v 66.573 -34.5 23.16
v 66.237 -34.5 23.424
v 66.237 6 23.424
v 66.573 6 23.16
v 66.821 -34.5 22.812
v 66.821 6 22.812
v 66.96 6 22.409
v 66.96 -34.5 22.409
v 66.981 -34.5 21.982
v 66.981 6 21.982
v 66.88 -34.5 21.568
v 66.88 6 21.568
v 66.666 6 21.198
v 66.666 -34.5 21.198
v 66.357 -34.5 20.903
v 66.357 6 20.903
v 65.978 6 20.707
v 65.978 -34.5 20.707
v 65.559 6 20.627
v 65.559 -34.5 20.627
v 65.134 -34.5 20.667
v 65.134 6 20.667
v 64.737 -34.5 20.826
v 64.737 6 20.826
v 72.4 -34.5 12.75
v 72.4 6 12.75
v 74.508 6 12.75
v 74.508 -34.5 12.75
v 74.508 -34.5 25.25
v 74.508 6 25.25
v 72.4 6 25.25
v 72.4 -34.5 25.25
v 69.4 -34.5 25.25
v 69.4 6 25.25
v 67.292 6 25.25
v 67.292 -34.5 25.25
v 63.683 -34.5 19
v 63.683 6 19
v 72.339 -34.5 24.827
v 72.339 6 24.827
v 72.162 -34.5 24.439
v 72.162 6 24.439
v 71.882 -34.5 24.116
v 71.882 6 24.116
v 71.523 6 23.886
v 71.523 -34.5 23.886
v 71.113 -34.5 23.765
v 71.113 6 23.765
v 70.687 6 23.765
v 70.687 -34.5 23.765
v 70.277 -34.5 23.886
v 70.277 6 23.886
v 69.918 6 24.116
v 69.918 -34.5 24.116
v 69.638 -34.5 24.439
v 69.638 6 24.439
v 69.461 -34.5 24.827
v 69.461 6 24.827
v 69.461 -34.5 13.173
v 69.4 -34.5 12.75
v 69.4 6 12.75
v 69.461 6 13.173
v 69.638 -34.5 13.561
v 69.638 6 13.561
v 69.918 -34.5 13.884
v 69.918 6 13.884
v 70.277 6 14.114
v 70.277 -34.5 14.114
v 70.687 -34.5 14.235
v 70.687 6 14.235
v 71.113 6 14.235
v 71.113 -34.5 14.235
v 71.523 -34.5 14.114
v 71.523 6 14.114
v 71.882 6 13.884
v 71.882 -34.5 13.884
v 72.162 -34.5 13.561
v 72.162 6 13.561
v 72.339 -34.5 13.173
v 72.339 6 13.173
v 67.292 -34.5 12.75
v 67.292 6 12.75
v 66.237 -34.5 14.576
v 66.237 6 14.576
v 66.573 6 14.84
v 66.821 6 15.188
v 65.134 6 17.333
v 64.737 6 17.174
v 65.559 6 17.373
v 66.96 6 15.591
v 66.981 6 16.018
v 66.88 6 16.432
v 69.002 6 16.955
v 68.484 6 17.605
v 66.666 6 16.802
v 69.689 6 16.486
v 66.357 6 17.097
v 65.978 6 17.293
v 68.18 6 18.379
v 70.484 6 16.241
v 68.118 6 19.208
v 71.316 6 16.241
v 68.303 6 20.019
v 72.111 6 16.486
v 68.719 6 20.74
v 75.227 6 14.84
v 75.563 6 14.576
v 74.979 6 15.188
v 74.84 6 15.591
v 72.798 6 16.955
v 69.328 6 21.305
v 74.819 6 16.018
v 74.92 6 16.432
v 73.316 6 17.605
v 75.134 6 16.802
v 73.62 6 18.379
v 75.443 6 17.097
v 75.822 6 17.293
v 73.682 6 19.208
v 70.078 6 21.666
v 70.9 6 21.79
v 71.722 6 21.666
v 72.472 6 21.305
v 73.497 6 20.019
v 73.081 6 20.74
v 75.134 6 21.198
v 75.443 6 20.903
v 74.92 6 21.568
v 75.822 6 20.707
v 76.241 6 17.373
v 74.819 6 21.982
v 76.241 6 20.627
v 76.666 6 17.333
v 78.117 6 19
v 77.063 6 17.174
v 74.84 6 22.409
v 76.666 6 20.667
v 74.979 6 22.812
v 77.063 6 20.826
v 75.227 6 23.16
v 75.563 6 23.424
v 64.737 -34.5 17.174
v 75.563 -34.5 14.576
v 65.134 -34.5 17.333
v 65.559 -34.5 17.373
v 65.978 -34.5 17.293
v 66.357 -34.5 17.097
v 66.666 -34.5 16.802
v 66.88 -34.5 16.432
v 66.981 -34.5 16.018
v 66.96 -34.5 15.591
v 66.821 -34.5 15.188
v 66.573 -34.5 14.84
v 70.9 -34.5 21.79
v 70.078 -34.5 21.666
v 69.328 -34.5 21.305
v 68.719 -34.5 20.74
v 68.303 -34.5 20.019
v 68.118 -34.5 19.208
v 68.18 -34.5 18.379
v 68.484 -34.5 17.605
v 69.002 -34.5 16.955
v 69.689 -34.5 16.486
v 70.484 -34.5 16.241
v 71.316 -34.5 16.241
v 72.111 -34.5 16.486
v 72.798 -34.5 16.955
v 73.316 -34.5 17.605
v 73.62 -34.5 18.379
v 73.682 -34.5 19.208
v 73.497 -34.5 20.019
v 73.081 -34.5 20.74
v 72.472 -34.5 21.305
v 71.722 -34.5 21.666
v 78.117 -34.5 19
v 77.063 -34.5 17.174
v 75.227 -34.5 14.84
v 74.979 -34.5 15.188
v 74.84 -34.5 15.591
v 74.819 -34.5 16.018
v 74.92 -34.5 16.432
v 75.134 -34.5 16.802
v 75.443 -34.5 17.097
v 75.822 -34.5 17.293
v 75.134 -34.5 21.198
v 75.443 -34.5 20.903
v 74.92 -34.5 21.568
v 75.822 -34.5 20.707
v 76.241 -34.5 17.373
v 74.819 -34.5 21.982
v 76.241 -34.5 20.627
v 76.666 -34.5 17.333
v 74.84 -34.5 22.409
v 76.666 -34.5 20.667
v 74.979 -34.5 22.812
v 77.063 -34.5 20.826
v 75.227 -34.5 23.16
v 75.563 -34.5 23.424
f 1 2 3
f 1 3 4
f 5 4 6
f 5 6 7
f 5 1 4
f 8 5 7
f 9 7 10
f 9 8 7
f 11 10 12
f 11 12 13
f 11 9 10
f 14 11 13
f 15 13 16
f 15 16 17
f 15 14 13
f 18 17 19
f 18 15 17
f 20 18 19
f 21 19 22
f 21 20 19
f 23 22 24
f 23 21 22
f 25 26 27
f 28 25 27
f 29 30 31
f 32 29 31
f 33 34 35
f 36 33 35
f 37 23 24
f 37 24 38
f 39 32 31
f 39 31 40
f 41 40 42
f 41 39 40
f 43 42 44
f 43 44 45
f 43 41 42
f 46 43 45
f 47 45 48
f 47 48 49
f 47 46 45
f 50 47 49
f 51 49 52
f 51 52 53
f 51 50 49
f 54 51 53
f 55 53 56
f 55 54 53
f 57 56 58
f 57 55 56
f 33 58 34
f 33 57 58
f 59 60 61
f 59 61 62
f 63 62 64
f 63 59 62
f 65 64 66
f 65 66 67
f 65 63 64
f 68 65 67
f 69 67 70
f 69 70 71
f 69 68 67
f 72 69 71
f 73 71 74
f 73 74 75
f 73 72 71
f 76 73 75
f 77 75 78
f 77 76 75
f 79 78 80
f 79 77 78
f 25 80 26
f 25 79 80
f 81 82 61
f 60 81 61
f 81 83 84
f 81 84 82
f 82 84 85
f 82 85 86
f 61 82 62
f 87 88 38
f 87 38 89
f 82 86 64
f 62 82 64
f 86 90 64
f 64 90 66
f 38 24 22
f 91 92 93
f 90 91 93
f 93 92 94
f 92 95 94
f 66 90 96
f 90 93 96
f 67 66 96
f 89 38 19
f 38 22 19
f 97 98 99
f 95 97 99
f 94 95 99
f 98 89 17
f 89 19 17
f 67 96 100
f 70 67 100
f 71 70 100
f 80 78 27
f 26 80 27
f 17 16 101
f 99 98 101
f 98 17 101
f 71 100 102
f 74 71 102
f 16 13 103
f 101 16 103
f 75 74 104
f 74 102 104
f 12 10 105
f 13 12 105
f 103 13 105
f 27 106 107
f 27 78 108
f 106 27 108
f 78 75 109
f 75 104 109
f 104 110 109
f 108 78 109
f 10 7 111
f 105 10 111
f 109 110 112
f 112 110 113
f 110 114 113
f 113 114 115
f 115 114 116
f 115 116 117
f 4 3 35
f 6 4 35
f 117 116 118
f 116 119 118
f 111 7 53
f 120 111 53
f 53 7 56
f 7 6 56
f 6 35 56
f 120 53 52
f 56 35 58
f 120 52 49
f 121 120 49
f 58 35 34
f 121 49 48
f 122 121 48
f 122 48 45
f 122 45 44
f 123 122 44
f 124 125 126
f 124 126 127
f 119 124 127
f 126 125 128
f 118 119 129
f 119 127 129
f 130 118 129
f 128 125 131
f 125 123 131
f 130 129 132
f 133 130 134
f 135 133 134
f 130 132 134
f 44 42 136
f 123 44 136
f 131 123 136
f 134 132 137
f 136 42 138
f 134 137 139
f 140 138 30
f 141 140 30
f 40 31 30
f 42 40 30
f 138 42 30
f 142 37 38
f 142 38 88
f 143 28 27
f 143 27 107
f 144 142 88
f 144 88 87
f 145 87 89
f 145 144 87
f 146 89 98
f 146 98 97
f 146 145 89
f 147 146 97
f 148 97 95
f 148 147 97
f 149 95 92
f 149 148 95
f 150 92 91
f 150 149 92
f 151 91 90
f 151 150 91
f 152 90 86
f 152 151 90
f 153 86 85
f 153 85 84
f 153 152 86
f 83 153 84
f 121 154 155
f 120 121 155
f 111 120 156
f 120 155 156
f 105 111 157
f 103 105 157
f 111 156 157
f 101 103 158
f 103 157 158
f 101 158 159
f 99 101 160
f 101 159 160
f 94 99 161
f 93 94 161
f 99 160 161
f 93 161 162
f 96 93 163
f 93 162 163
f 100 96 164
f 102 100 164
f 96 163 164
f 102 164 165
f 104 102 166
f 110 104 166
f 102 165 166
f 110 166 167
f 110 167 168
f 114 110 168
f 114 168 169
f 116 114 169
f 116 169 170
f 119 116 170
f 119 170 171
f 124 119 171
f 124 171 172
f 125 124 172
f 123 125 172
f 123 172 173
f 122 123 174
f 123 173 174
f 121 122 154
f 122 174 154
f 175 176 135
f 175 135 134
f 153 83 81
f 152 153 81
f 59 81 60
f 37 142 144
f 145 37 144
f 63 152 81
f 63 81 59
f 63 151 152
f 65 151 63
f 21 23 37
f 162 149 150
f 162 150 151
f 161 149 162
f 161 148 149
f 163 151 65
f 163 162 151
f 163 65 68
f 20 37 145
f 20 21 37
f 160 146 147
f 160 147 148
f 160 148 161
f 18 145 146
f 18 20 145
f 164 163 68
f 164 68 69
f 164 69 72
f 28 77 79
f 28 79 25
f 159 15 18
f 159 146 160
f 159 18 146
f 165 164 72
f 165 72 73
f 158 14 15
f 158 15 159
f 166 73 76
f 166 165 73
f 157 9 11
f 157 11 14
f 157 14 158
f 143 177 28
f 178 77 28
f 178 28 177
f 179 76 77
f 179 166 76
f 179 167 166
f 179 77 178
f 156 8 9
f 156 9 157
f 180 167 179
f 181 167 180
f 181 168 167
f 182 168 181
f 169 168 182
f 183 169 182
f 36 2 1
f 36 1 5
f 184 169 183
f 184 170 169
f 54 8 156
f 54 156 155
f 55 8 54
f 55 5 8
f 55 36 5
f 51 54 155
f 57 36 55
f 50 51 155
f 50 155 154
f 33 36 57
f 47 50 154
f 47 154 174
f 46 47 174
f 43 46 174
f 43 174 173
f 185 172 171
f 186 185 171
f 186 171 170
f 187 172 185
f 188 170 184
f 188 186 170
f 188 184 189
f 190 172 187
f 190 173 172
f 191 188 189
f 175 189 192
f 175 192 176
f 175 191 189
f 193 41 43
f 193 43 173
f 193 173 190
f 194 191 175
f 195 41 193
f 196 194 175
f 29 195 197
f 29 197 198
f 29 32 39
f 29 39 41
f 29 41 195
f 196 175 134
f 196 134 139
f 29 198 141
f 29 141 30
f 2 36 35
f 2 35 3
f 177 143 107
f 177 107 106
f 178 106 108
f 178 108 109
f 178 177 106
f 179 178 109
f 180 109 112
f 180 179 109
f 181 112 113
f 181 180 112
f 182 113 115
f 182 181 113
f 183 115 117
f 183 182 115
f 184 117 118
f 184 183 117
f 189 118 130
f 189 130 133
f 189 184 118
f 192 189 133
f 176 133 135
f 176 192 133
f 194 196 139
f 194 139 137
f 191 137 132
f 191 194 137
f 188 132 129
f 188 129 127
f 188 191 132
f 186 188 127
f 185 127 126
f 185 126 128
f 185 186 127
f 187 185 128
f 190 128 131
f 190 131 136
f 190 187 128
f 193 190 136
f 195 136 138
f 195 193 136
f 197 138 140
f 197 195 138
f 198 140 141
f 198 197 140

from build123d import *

# Parameters (mm, degrees)
ESBO_O1_R                = 2.79
RESSALTO_EXTRUS_O1_DEPTH = 40.5


with BuildPart() as part:
    # Esboço1 → Ressalto-extrusão1 (new body)
    with BuildSketch(Plane.XZ.offset(34.5)):
        with BuildLine():
            Line((77.062658774, 17.174038106), (78.116878365, 19))
            Line((78.116878365, 19), (77.062658774, 20.825961894))
            ThreePointArc((77.062658774, 20.825961894), (75.013620668, 21.375), (75.562658774, 23.424038106))
            Line((75.562658774, 23.424038106), (74.508439182, 25.25))
            Line((74.508439182, 25.25), (72.4, 25.25))
            ThreePointArc((72.4, 25.25), (70.9, 23.75), (69.4, 25.25))
            Line((69.4, 25.25), (67.291560818, 25.25))
            Line((67.291560818, 25.25), (66.237341226, 23.424038106))
            ThreePointArc((66.237341226, 23.424038106), (66.786379332, 21.375), (64.737341226, 20.825961894))
            Line((64.737341226, 20.825961894), (63.683121635, 19))
            Line((63.683121635, 19), (64.737341226, 17.174038106))
            ThreePointArc((64.737341226, 17.174038106), (66.786379332, 16.625), (66.237341226, 14.575961894))
            Line((66.237341226, 14.575961894), (67.291560818, 12.75))
            Line((67.291560818, 12.75), (69.4, 12.75))
            ThreePointArc((69.4, 12.75), (70.9, 14.25), (72.4, 12.75))
            Line((72.4, 12.75), (74.508439182, 12.75))
            Line((74.508439182, 12.75), (75.562658774, 14.575961894))
            ThreePointArc((75.562658774, 14.575961894), (75.013620668, 16.625), (77.062658774, 17.174038106))
        make_face()
        with Locations(Location((70.9, 19, 0), (0, 0, 90))):
            Circle(ESBO_O1_R, mode=Mode.SUBTRACT)
    extrude(amount=-RESSALTO_EXTRUS_O1_DEPTH)


solid = part.part
